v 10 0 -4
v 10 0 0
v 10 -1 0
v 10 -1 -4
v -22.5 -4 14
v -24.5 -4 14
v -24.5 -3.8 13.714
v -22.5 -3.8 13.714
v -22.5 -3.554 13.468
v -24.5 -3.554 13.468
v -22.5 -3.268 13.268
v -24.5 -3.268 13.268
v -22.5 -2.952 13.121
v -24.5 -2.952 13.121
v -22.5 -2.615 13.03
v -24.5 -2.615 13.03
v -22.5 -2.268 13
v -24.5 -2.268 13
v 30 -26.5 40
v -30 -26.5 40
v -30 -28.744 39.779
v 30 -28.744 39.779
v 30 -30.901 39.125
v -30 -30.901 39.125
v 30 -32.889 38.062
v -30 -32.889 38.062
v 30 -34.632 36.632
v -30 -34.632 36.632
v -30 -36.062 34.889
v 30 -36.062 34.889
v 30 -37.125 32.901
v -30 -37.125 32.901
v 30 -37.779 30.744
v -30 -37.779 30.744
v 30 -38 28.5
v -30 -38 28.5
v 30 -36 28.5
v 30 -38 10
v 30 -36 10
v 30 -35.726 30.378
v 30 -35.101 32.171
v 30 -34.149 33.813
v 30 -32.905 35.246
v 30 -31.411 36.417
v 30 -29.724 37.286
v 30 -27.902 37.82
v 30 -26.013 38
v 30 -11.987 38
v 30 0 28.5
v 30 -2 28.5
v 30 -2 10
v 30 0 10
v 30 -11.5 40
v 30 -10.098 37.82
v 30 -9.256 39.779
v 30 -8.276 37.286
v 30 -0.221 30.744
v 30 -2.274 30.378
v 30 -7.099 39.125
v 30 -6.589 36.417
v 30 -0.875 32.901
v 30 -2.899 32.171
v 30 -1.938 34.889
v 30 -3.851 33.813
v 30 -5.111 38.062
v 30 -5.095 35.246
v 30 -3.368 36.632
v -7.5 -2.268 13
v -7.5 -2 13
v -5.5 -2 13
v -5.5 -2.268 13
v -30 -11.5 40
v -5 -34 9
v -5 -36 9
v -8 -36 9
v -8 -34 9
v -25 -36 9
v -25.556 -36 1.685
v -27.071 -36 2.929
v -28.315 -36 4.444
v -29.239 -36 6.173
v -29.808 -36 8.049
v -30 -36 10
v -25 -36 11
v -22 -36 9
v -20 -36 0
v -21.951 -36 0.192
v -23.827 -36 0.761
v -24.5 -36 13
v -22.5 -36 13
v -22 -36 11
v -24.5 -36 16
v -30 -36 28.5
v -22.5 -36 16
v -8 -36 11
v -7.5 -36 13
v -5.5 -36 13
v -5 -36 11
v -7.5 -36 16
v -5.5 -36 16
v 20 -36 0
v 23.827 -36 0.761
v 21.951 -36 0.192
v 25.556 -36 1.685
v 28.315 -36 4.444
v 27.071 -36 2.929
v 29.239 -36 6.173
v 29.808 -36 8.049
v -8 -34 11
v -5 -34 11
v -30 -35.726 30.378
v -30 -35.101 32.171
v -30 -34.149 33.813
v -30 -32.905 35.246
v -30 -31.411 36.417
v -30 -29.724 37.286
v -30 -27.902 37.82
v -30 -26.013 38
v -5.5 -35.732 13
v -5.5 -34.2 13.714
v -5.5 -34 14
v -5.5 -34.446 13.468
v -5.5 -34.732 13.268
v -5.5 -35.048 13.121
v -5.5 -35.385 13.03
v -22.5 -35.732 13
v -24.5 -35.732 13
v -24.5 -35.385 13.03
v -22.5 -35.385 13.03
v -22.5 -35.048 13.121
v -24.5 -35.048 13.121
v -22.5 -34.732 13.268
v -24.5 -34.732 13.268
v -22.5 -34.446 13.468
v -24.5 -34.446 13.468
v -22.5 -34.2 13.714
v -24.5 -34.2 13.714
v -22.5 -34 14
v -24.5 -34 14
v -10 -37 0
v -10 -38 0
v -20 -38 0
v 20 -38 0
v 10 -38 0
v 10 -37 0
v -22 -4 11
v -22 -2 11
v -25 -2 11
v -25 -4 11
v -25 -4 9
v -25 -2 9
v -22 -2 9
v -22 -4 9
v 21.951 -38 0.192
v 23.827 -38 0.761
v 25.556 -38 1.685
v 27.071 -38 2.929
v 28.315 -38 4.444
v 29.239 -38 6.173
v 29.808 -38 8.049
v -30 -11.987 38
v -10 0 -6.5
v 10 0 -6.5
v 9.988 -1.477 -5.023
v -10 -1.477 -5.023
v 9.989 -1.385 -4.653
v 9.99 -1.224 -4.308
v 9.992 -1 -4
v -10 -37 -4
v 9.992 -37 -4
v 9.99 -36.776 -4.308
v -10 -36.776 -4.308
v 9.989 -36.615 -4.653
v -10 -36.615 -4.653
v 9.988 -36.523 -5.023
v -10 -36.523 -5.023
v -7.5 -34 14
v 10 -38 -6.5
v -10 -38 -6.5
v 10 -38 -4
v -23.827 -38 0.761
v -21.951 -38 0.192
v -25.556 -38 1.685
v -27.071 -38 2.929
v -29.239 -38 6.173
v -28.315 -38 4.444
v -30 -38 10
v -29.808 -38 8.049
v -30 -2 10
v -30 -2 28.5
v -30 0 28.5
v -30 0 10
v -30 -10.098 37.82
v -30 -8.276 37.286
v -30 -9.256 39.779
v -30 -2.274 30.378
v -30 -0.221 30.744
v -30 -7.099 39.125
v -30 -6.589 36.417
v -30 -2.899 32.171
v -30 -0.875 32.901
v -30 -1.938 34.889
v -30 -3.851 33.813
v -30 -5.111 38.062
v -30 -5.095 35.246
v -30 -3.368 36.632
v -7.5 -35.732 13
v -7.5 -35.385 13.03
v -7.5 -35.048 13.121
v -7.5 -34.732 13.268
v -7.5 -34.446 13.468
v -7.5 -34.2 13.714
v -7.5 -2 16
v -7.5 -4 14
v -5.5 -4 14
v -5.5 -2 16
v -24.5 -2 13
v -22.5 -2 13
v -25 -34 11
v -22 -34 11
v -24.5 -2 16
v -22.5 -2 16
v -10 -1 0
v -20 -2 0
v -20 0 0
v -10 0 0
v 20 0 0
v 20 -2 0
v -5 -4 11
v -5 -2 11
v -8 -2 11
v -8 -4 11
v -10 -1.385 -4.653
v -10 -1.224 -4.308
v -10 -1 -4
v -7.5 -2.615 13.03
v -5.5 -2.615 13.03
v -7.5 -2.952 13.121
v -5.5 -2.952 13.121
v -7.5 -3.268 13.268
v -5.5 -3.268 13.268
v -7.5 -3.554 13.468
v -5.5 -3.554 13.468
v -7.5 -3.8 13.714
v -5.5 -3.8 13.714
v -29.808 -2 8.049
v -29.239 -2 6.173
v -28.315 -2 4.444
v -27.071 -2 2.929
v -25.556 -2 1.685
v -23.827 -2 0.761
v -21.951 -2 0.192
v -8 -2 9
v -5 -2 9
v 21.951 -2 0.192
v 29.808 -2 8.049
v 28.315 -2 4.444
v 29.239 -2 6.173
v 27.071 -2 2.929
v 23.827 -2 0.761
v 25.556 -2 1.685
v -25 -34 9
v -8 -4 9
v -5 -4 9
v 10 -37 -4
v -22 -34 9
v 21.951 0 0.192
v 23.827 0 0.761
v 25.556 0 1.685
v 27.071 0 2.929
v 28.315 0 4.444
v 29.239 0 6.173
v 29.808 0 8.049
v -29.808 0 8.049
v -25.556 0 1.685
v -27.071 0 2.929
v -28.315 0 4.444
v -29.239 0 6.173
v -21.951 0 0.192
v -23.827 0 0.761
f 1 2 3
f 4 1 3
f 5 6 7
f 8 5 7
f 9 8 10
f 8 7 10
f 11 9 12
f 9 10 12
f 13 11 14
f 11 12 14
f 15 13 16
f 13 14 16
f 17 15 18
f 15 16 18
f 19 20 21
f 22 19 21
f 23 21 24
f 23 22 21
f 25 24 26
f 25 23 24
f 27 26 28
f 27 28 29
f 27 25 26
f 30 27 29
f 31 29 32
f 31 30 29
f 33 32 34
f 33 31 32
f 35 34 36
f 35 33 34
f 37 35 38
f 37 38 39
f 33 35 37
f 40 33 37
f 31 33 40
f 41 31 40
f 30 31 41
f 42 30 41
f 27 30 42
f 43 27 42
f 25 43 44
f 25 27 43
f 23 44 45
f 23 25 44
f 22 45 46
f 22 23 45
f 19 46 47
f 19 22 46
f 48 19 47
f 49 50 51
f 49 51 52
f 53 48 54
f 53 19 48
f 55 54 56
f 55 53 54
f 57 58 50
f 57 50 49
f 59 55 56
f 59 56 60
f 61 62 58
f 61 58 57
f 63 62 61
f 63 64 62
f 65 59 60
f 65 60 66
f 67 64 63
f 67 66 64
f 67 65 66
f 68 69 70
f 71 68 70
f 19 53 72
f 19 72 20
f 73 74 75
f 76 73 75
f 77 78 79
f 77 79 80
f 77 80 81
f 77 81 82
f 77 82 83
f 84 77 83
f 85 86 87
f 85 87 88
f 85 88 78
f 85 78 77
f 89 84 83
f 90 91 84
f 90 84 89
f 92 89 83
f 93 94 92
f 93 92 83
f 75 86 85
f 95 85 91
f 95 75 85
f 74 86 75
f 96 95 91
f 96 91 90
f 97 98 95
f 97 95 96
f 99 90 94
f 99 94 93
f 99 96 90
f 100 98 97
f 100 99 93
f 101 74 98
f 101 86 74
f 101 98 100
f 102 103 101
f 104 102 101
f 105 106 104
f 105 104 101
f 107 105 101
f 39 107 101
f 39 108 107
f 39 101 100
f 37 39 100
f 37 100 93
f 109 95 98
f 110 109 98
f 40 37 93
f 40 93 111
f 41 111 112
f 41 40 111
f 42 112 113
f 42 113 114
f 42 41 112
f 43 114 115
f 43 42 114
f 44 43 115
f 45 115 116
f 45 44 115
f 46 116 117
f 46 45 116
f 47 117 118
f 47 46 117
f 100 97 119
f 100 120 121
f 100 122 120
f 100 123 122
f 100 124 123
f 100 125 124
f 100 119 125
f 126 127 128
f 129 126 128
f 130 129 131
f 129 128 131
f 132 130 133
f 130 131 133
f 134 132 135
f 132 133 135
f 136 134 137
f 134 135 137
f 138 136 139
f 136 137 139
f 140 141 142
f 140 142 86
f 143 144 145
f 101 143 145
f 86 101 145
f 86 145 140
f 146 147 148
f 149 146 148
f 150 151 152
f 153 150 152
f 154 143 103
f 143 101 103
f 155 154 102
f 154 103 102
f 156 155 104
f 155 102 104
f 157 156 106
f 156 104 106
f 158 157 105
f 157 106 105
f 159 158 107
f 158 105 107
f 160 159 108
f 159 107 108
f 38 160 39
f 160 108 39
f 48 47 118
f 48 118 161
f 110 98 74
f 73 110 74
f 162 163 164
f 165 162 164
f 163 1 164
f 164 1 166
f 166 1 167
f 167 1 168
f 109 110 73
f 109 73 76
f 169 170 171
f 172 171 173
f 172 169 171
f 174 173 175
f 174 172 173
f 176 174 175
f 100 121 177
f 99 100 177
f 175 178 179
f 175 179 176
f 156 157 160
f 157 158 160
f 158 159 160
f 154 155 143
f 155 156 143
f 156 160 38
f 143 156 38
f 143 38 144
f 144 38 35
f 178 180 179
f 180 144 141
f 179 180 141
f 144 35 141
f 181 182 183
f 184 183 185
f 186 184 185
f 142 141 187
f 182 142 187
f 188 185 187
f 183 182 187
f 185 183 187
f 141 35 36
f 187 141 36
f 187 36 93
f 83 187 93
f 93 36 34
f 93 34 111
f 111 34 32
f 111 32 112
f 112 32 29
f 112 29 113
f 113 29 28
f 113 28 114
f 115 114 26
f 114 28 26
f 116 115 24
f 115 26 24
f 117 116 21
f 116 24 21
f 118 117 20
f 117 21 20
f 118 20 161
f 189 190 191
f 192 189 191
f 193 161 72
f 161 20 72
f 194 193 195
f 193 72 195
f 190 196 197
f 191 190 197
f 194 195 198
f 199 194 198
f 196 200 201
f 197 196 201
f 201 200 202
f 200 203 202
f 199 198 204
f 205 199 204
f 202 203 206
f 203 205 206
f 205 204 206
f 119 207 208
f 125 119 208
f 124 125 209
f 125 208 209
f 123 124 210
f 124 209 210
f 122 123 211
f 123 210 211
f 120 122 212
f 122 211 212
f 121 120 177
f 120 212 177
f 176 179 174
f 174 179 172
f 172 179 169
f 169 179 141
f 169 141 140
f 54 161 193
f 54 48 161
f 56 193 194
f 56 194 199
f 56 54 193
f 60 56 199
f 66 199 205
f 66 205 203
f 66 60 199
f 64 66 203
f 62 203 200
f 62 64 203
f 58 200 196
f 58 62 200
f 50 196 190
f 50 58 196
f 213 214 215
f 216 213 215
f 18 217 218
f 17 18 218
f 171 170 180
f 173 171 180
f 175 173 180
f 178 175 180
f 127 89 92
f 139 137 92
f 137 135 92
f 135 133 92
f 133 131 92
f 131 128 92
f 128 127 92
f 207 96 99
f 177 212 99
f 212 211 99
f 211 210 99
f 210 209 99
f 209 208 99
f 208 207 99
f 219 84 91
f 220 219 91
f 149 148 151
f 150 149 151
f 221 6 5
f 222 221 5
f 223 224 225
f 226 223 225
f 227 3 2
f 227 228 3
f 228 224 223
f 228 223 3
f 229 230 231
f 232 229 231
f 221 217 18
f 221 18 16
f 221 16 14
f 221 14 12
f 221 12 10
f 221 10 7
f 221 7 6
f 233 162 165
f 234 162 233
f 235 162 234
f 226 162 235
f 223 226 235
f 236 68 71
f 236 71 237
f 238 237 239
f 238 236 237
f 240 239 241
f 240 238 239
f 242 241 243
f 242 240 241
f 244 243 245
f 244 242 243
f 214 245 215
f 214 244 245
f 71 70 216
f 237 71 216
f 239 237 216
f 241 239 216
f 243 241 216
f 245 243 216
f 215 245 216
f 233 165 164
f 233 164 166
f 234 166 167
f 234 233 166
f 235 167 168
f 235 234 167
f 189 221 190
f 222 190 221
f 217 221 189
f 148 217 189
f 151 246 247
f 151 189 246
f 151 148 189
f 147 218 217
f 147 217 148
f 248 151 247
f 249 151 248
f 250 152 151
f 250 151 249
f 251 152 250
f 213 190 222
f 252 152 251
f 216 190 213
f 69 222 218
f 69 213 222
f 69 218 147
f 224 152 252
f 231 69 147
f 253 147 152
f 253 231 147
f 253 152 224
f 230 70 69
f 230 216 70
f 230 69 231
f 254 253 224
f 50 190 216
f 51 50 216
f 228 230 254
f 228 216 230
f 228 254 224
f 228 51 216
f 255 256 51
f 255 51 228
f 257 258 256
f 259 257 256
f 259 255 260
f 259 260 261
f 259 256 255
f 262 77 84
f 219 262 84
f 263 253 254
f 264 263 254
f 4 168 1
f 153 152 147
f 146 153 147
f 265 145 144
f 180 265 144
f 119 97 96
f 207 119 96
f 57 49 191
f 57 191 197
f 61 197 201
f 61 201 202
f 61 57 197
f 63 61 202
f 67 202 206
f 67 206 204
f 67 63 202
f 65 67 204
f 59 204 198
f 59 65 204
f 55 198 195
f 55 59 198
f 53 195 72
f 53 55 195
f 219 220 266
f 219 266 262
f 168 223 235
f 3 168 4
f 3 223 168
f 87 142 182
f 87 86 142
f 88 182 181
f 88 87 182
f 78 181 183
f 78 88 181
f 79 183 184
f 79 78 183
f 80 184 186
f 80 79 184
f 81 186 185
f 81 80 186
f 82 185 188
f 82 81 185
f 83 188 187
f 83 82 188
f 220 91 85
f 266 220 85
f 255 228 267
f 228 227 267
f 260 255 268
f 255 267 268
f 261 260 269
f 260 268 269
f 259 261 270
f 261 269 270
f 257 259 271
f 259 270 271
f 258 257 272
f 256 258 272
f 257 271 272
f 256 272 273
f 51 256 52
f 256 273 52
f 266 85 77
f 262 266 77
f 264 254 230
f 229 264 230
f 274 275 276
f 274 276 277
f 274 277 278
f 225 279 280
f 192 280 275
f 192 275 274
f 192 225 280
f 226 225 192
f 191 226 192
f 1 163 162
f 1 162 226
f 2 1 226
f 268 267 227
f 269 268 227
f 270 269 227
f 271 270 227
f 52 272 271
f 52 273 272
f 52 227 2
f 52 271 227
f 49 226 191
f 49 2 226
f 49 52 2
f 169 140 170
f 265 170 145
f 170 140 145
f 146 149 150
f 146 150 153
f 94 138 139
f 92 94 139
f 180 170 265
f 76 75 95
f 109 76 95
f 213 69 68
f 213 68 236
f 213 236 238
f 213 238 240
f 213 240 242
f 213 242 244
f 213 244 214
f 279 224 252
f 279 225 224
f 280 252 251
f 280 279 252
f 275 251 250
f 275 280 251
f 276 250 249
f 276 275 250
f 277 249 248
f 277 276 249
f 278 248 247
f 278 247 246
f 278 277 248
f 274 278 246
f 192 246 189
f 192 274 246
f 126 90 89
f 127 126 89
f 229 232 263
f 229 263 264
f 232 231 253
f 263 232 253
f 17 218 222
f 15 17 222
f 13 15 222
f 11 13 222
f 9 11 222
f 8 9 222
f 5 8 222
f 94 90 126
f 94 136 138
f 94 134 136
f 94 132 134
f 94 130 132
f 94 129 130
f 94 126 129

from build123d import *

# Parameters (mm, degrees)
F1_DEPTH     = 30
F2_R         = 10
F3_W         = 20
F3_H         = 1
F4_DEPTH     = 4
F6_DEPTH     = 3
F7_T1_DEPTH  = 26.6017443282
F8_T1_DEPTH  = 30.2743860668
F9_W         = 2
F9_H         = 3
F11_DEPTH    = 2
F10_W        = 2
F10_H        = 3
F12_DEPTH    = 2
F13_SIZE     = 1.99999
F14_T1_DEPTH = 10.6602829052
F14_T3_DEPTH = 10.6602829052


# Not quite as in the source:
# - a fillet or chamfer that OpenCascade refuses, or shapes differently, is made with other operations: its cross-section is extruded or revolved along the edge and cut away or added
# - a fillet or chamfer is up to 0.001 mm smaller than in the source, because OpenCascade refuses the exact size


with BuildPart() as f1:
    # F0 (on Right) → F1 (new body, symmetric)
    with BuildSketch(Plane.YZ):
        with BuildLine():
            Line((-2, 0), (0, 0))
            Line((0, 0), (0, 28.5))
            ThreePointArc((0, 28.5), (-3.3682720164, 36.6317279836), (-11.5, 40))
            Line((-11.5, 40), (-26.5, 40))
            ThreePointArc((-26.5, 40), (-34.6317279836, 36.6317279836), (-38, 28.5))
            Line((-38, 28.5), (-38, 0))
            Line((-38, 0), (-36, 0))
            Line((-36, 0), (-36, 28.5))
            ThreePointArc((-36, 28.5), (-32.9045321983, 35.2456883731), (-26.0125078223, 38))
            Line((-26.0125078223, 38), (-11.9874921777, 38))
            ThreePointArc((-11.9874921777, 38), (-5.0954678017, 35.2456883731), (-2, 28.5))
            Line((-2, 28.5), (-2, 0))
        make_face()
    extrude(amount=F1_DEPTH, both=True)

    # F2
    f2_edges = [f1.edges().sort_by_distance(p)[0] for p in [
        (30, -37, 0),
        (30, -1, 0),
        (-30, -1, 0),
        (-30, -37, 0),
    ]]
    fillet(f2_edges, radius=F2_R)

    # F3 (on face) → F4 (join)
    with BuildSketch(Plane(origin=(0, 0, 0), x_dir=(1, 0, 0), z_dir=(0, 0, -1))):
        with Locations((0, 0.5)):
            Rectangle(F3_W, F3_H)
        with Locations((0, 37.5)):
            Rectangle(F3_W, F3_H)
    extrude(amount=F4_DEPTH)

    # F5 (on face) → F6 (join)
    with BuildSketch(Plane(origin=(0, 0, -4), x_dir=(1, 0, 0), z_dir=(0, 0, -1))):
        Polygon((10, 38), (-10, 38), (-10, 36.5000508078), (9.987654115, 36.5000508078), align=None)
        Polygon((-10, 1.4999491922), (-10, 0), (10, 0), (9.987654115, 1.4999491922), align=None)
    extrude(amount=F6_DEPTH)

    # F7: fillet of radius 2 on 2 edges, made by hand

    # F7_s2 → F7_t1 (cut)
    with BuildSketch(Plane.YZ.offset(-13.3070451066)):
        with BuildLine():
            ThreePointArc((-1.4999491922, -5.3228180426), (-1.3707914645, -4.6157471889), (-1, -4))
            Line((-1, -4), (-1.4999491922, -4))
            Line((-1.4999491922, -4), (-1.4999491922, -5.3228180426))
        make_face()
        with BuildLine():
            ThreePointArc((-37, -4), (-36.6292085355, -4.6157471889), (-36.5000508078, -5.3228180426))
            Line((-36.5000508078, -5.3228180426), (-36.5000508078, -4))
            Line((-36.5000508078, -4), (-37, -4))
        make_face()
    extrude(amount=F7_T1_DEPTH, mode=Mode.SUBTRACT)

    # F8: chamfer of 2 on 2 edges, made by hand

    # F8_s2 → F8_t1 (cut)
    with BuildSketch(Plane.YZ.offset(-15.1433659759)):
        Polygon((0.5000508078, -7), (-1.4999491922, -5), (-1.4999491922, -7), align=None)
        Polygon((-38.5000508078, -7), (-36.5000508078, -5), (-36.5000508078, -7), align=None)
    extrude(amount=F8_T1_DEPTH, mode=Mode.SUBTRACT)

    # F9 (on face) → F11 (join)
    with BuildSketch(Plane.XZ.offset(2)):
        Polygon((-25, 11), (-25, 10), (-25, 9), (-22, 9), (-22, 11), align=None)
        with Locations((-23.5, 14.5)):
            Rectangle(F9_W, F9_H)
        Polygon((-5, 9), (-5, 10), (-5, 11), (-8, 11), (-8, 9), align=None)
        with Locations((-6.5, 14.5)):
            Rectangle(F9_W, F9_H)
    extrude(amount=F11_DEPTH)

    # F10 (on face) → F12 (join)
    with BuildSketch(Plane(origin=(0, -36, 0), x_dir=(-1, 0, 0), z_dir=(0, 1, 0))):
        Polygon((22, 11), (22, 10), (22, 9), (25, 9), (25, 11), align=None)
        with Locations((23.5, 14.5)):
            Rectangle(F10_W, F10_H)
        Polygon((8, 9), (8, 10), (8, 11), (5, 11), (5, 9), align=None)
        with Locations((6.5, 14.5)):
            Rectangle(F10_W, F10_H)
    extrude(amount=F12_DEPTH)

    # F13 (size 2 in the source; OpenCascade refuses exactly that, so slightly less here)
    f13_edges = [f1.edges().sort_by_distance(p)[0] for p in [
        (-23.5, -4, 16),
        (-23.5, -34, 16),
        (-6.5, -4, 16),
        (-6.5, -34, 16),
    ]]
    chamfer(f13_edges, length=F13_SIZE)

    # F14: fillet of radius 2 on 4 edges, made by hand

    # F14_s2 → F14_t1 (cut)
    with BuildSketch(Plane.YZ.offset(-28.8301414526)):
        with BuildLine():
            ThreePointArc((-4, 14.00001), (-3.267948419, 13.2679520792), (-2.267943419, 13))
            Line((-2.267943419, 13), (-4, 13))
            Line((-4, 13), (-4, 14.00001))
        make_face()
        with BuildLine():
            ThreePointArc((-35.732056581, 13), (-34.732051581, 13.2679520792), (-34, 14.00001))
            Line((-34, 14.00001), (-34, 13))
            Line((-34, 13), (-35.732056581, 13))
        make_face()
    extrude(amount=F14_T1_DEPTH, mode=Mode.SUBTRACT)

    # F14_s4 → F14_t3 (cut)
    with BuildSketch(Plane.YZ.offset(-11.8301414526)):
        with BuildLine():
            ThreePointArc((-2.267943419, 13), (-3.267948419, 13.2679520792), (-4, 14.00001))
            Line((-4, 14.00001), (-4, 13))
            Line((-4, 13), (-2.267943419, 13))
        make_face()
        with BuildLine():
            ThreePointArc((-35.732056581, 13), (-34.732051581, 13.2679520792), (-34, 14.00001))
            Line((-34, 14.00001), (-34, 13))
            Line((-34, 13), (-35.732056581, 13))
        make_face()
    extrude(amount=F14_T3_DEPTH, mode=Mode.SUBTRACT)


solid = f1.part
